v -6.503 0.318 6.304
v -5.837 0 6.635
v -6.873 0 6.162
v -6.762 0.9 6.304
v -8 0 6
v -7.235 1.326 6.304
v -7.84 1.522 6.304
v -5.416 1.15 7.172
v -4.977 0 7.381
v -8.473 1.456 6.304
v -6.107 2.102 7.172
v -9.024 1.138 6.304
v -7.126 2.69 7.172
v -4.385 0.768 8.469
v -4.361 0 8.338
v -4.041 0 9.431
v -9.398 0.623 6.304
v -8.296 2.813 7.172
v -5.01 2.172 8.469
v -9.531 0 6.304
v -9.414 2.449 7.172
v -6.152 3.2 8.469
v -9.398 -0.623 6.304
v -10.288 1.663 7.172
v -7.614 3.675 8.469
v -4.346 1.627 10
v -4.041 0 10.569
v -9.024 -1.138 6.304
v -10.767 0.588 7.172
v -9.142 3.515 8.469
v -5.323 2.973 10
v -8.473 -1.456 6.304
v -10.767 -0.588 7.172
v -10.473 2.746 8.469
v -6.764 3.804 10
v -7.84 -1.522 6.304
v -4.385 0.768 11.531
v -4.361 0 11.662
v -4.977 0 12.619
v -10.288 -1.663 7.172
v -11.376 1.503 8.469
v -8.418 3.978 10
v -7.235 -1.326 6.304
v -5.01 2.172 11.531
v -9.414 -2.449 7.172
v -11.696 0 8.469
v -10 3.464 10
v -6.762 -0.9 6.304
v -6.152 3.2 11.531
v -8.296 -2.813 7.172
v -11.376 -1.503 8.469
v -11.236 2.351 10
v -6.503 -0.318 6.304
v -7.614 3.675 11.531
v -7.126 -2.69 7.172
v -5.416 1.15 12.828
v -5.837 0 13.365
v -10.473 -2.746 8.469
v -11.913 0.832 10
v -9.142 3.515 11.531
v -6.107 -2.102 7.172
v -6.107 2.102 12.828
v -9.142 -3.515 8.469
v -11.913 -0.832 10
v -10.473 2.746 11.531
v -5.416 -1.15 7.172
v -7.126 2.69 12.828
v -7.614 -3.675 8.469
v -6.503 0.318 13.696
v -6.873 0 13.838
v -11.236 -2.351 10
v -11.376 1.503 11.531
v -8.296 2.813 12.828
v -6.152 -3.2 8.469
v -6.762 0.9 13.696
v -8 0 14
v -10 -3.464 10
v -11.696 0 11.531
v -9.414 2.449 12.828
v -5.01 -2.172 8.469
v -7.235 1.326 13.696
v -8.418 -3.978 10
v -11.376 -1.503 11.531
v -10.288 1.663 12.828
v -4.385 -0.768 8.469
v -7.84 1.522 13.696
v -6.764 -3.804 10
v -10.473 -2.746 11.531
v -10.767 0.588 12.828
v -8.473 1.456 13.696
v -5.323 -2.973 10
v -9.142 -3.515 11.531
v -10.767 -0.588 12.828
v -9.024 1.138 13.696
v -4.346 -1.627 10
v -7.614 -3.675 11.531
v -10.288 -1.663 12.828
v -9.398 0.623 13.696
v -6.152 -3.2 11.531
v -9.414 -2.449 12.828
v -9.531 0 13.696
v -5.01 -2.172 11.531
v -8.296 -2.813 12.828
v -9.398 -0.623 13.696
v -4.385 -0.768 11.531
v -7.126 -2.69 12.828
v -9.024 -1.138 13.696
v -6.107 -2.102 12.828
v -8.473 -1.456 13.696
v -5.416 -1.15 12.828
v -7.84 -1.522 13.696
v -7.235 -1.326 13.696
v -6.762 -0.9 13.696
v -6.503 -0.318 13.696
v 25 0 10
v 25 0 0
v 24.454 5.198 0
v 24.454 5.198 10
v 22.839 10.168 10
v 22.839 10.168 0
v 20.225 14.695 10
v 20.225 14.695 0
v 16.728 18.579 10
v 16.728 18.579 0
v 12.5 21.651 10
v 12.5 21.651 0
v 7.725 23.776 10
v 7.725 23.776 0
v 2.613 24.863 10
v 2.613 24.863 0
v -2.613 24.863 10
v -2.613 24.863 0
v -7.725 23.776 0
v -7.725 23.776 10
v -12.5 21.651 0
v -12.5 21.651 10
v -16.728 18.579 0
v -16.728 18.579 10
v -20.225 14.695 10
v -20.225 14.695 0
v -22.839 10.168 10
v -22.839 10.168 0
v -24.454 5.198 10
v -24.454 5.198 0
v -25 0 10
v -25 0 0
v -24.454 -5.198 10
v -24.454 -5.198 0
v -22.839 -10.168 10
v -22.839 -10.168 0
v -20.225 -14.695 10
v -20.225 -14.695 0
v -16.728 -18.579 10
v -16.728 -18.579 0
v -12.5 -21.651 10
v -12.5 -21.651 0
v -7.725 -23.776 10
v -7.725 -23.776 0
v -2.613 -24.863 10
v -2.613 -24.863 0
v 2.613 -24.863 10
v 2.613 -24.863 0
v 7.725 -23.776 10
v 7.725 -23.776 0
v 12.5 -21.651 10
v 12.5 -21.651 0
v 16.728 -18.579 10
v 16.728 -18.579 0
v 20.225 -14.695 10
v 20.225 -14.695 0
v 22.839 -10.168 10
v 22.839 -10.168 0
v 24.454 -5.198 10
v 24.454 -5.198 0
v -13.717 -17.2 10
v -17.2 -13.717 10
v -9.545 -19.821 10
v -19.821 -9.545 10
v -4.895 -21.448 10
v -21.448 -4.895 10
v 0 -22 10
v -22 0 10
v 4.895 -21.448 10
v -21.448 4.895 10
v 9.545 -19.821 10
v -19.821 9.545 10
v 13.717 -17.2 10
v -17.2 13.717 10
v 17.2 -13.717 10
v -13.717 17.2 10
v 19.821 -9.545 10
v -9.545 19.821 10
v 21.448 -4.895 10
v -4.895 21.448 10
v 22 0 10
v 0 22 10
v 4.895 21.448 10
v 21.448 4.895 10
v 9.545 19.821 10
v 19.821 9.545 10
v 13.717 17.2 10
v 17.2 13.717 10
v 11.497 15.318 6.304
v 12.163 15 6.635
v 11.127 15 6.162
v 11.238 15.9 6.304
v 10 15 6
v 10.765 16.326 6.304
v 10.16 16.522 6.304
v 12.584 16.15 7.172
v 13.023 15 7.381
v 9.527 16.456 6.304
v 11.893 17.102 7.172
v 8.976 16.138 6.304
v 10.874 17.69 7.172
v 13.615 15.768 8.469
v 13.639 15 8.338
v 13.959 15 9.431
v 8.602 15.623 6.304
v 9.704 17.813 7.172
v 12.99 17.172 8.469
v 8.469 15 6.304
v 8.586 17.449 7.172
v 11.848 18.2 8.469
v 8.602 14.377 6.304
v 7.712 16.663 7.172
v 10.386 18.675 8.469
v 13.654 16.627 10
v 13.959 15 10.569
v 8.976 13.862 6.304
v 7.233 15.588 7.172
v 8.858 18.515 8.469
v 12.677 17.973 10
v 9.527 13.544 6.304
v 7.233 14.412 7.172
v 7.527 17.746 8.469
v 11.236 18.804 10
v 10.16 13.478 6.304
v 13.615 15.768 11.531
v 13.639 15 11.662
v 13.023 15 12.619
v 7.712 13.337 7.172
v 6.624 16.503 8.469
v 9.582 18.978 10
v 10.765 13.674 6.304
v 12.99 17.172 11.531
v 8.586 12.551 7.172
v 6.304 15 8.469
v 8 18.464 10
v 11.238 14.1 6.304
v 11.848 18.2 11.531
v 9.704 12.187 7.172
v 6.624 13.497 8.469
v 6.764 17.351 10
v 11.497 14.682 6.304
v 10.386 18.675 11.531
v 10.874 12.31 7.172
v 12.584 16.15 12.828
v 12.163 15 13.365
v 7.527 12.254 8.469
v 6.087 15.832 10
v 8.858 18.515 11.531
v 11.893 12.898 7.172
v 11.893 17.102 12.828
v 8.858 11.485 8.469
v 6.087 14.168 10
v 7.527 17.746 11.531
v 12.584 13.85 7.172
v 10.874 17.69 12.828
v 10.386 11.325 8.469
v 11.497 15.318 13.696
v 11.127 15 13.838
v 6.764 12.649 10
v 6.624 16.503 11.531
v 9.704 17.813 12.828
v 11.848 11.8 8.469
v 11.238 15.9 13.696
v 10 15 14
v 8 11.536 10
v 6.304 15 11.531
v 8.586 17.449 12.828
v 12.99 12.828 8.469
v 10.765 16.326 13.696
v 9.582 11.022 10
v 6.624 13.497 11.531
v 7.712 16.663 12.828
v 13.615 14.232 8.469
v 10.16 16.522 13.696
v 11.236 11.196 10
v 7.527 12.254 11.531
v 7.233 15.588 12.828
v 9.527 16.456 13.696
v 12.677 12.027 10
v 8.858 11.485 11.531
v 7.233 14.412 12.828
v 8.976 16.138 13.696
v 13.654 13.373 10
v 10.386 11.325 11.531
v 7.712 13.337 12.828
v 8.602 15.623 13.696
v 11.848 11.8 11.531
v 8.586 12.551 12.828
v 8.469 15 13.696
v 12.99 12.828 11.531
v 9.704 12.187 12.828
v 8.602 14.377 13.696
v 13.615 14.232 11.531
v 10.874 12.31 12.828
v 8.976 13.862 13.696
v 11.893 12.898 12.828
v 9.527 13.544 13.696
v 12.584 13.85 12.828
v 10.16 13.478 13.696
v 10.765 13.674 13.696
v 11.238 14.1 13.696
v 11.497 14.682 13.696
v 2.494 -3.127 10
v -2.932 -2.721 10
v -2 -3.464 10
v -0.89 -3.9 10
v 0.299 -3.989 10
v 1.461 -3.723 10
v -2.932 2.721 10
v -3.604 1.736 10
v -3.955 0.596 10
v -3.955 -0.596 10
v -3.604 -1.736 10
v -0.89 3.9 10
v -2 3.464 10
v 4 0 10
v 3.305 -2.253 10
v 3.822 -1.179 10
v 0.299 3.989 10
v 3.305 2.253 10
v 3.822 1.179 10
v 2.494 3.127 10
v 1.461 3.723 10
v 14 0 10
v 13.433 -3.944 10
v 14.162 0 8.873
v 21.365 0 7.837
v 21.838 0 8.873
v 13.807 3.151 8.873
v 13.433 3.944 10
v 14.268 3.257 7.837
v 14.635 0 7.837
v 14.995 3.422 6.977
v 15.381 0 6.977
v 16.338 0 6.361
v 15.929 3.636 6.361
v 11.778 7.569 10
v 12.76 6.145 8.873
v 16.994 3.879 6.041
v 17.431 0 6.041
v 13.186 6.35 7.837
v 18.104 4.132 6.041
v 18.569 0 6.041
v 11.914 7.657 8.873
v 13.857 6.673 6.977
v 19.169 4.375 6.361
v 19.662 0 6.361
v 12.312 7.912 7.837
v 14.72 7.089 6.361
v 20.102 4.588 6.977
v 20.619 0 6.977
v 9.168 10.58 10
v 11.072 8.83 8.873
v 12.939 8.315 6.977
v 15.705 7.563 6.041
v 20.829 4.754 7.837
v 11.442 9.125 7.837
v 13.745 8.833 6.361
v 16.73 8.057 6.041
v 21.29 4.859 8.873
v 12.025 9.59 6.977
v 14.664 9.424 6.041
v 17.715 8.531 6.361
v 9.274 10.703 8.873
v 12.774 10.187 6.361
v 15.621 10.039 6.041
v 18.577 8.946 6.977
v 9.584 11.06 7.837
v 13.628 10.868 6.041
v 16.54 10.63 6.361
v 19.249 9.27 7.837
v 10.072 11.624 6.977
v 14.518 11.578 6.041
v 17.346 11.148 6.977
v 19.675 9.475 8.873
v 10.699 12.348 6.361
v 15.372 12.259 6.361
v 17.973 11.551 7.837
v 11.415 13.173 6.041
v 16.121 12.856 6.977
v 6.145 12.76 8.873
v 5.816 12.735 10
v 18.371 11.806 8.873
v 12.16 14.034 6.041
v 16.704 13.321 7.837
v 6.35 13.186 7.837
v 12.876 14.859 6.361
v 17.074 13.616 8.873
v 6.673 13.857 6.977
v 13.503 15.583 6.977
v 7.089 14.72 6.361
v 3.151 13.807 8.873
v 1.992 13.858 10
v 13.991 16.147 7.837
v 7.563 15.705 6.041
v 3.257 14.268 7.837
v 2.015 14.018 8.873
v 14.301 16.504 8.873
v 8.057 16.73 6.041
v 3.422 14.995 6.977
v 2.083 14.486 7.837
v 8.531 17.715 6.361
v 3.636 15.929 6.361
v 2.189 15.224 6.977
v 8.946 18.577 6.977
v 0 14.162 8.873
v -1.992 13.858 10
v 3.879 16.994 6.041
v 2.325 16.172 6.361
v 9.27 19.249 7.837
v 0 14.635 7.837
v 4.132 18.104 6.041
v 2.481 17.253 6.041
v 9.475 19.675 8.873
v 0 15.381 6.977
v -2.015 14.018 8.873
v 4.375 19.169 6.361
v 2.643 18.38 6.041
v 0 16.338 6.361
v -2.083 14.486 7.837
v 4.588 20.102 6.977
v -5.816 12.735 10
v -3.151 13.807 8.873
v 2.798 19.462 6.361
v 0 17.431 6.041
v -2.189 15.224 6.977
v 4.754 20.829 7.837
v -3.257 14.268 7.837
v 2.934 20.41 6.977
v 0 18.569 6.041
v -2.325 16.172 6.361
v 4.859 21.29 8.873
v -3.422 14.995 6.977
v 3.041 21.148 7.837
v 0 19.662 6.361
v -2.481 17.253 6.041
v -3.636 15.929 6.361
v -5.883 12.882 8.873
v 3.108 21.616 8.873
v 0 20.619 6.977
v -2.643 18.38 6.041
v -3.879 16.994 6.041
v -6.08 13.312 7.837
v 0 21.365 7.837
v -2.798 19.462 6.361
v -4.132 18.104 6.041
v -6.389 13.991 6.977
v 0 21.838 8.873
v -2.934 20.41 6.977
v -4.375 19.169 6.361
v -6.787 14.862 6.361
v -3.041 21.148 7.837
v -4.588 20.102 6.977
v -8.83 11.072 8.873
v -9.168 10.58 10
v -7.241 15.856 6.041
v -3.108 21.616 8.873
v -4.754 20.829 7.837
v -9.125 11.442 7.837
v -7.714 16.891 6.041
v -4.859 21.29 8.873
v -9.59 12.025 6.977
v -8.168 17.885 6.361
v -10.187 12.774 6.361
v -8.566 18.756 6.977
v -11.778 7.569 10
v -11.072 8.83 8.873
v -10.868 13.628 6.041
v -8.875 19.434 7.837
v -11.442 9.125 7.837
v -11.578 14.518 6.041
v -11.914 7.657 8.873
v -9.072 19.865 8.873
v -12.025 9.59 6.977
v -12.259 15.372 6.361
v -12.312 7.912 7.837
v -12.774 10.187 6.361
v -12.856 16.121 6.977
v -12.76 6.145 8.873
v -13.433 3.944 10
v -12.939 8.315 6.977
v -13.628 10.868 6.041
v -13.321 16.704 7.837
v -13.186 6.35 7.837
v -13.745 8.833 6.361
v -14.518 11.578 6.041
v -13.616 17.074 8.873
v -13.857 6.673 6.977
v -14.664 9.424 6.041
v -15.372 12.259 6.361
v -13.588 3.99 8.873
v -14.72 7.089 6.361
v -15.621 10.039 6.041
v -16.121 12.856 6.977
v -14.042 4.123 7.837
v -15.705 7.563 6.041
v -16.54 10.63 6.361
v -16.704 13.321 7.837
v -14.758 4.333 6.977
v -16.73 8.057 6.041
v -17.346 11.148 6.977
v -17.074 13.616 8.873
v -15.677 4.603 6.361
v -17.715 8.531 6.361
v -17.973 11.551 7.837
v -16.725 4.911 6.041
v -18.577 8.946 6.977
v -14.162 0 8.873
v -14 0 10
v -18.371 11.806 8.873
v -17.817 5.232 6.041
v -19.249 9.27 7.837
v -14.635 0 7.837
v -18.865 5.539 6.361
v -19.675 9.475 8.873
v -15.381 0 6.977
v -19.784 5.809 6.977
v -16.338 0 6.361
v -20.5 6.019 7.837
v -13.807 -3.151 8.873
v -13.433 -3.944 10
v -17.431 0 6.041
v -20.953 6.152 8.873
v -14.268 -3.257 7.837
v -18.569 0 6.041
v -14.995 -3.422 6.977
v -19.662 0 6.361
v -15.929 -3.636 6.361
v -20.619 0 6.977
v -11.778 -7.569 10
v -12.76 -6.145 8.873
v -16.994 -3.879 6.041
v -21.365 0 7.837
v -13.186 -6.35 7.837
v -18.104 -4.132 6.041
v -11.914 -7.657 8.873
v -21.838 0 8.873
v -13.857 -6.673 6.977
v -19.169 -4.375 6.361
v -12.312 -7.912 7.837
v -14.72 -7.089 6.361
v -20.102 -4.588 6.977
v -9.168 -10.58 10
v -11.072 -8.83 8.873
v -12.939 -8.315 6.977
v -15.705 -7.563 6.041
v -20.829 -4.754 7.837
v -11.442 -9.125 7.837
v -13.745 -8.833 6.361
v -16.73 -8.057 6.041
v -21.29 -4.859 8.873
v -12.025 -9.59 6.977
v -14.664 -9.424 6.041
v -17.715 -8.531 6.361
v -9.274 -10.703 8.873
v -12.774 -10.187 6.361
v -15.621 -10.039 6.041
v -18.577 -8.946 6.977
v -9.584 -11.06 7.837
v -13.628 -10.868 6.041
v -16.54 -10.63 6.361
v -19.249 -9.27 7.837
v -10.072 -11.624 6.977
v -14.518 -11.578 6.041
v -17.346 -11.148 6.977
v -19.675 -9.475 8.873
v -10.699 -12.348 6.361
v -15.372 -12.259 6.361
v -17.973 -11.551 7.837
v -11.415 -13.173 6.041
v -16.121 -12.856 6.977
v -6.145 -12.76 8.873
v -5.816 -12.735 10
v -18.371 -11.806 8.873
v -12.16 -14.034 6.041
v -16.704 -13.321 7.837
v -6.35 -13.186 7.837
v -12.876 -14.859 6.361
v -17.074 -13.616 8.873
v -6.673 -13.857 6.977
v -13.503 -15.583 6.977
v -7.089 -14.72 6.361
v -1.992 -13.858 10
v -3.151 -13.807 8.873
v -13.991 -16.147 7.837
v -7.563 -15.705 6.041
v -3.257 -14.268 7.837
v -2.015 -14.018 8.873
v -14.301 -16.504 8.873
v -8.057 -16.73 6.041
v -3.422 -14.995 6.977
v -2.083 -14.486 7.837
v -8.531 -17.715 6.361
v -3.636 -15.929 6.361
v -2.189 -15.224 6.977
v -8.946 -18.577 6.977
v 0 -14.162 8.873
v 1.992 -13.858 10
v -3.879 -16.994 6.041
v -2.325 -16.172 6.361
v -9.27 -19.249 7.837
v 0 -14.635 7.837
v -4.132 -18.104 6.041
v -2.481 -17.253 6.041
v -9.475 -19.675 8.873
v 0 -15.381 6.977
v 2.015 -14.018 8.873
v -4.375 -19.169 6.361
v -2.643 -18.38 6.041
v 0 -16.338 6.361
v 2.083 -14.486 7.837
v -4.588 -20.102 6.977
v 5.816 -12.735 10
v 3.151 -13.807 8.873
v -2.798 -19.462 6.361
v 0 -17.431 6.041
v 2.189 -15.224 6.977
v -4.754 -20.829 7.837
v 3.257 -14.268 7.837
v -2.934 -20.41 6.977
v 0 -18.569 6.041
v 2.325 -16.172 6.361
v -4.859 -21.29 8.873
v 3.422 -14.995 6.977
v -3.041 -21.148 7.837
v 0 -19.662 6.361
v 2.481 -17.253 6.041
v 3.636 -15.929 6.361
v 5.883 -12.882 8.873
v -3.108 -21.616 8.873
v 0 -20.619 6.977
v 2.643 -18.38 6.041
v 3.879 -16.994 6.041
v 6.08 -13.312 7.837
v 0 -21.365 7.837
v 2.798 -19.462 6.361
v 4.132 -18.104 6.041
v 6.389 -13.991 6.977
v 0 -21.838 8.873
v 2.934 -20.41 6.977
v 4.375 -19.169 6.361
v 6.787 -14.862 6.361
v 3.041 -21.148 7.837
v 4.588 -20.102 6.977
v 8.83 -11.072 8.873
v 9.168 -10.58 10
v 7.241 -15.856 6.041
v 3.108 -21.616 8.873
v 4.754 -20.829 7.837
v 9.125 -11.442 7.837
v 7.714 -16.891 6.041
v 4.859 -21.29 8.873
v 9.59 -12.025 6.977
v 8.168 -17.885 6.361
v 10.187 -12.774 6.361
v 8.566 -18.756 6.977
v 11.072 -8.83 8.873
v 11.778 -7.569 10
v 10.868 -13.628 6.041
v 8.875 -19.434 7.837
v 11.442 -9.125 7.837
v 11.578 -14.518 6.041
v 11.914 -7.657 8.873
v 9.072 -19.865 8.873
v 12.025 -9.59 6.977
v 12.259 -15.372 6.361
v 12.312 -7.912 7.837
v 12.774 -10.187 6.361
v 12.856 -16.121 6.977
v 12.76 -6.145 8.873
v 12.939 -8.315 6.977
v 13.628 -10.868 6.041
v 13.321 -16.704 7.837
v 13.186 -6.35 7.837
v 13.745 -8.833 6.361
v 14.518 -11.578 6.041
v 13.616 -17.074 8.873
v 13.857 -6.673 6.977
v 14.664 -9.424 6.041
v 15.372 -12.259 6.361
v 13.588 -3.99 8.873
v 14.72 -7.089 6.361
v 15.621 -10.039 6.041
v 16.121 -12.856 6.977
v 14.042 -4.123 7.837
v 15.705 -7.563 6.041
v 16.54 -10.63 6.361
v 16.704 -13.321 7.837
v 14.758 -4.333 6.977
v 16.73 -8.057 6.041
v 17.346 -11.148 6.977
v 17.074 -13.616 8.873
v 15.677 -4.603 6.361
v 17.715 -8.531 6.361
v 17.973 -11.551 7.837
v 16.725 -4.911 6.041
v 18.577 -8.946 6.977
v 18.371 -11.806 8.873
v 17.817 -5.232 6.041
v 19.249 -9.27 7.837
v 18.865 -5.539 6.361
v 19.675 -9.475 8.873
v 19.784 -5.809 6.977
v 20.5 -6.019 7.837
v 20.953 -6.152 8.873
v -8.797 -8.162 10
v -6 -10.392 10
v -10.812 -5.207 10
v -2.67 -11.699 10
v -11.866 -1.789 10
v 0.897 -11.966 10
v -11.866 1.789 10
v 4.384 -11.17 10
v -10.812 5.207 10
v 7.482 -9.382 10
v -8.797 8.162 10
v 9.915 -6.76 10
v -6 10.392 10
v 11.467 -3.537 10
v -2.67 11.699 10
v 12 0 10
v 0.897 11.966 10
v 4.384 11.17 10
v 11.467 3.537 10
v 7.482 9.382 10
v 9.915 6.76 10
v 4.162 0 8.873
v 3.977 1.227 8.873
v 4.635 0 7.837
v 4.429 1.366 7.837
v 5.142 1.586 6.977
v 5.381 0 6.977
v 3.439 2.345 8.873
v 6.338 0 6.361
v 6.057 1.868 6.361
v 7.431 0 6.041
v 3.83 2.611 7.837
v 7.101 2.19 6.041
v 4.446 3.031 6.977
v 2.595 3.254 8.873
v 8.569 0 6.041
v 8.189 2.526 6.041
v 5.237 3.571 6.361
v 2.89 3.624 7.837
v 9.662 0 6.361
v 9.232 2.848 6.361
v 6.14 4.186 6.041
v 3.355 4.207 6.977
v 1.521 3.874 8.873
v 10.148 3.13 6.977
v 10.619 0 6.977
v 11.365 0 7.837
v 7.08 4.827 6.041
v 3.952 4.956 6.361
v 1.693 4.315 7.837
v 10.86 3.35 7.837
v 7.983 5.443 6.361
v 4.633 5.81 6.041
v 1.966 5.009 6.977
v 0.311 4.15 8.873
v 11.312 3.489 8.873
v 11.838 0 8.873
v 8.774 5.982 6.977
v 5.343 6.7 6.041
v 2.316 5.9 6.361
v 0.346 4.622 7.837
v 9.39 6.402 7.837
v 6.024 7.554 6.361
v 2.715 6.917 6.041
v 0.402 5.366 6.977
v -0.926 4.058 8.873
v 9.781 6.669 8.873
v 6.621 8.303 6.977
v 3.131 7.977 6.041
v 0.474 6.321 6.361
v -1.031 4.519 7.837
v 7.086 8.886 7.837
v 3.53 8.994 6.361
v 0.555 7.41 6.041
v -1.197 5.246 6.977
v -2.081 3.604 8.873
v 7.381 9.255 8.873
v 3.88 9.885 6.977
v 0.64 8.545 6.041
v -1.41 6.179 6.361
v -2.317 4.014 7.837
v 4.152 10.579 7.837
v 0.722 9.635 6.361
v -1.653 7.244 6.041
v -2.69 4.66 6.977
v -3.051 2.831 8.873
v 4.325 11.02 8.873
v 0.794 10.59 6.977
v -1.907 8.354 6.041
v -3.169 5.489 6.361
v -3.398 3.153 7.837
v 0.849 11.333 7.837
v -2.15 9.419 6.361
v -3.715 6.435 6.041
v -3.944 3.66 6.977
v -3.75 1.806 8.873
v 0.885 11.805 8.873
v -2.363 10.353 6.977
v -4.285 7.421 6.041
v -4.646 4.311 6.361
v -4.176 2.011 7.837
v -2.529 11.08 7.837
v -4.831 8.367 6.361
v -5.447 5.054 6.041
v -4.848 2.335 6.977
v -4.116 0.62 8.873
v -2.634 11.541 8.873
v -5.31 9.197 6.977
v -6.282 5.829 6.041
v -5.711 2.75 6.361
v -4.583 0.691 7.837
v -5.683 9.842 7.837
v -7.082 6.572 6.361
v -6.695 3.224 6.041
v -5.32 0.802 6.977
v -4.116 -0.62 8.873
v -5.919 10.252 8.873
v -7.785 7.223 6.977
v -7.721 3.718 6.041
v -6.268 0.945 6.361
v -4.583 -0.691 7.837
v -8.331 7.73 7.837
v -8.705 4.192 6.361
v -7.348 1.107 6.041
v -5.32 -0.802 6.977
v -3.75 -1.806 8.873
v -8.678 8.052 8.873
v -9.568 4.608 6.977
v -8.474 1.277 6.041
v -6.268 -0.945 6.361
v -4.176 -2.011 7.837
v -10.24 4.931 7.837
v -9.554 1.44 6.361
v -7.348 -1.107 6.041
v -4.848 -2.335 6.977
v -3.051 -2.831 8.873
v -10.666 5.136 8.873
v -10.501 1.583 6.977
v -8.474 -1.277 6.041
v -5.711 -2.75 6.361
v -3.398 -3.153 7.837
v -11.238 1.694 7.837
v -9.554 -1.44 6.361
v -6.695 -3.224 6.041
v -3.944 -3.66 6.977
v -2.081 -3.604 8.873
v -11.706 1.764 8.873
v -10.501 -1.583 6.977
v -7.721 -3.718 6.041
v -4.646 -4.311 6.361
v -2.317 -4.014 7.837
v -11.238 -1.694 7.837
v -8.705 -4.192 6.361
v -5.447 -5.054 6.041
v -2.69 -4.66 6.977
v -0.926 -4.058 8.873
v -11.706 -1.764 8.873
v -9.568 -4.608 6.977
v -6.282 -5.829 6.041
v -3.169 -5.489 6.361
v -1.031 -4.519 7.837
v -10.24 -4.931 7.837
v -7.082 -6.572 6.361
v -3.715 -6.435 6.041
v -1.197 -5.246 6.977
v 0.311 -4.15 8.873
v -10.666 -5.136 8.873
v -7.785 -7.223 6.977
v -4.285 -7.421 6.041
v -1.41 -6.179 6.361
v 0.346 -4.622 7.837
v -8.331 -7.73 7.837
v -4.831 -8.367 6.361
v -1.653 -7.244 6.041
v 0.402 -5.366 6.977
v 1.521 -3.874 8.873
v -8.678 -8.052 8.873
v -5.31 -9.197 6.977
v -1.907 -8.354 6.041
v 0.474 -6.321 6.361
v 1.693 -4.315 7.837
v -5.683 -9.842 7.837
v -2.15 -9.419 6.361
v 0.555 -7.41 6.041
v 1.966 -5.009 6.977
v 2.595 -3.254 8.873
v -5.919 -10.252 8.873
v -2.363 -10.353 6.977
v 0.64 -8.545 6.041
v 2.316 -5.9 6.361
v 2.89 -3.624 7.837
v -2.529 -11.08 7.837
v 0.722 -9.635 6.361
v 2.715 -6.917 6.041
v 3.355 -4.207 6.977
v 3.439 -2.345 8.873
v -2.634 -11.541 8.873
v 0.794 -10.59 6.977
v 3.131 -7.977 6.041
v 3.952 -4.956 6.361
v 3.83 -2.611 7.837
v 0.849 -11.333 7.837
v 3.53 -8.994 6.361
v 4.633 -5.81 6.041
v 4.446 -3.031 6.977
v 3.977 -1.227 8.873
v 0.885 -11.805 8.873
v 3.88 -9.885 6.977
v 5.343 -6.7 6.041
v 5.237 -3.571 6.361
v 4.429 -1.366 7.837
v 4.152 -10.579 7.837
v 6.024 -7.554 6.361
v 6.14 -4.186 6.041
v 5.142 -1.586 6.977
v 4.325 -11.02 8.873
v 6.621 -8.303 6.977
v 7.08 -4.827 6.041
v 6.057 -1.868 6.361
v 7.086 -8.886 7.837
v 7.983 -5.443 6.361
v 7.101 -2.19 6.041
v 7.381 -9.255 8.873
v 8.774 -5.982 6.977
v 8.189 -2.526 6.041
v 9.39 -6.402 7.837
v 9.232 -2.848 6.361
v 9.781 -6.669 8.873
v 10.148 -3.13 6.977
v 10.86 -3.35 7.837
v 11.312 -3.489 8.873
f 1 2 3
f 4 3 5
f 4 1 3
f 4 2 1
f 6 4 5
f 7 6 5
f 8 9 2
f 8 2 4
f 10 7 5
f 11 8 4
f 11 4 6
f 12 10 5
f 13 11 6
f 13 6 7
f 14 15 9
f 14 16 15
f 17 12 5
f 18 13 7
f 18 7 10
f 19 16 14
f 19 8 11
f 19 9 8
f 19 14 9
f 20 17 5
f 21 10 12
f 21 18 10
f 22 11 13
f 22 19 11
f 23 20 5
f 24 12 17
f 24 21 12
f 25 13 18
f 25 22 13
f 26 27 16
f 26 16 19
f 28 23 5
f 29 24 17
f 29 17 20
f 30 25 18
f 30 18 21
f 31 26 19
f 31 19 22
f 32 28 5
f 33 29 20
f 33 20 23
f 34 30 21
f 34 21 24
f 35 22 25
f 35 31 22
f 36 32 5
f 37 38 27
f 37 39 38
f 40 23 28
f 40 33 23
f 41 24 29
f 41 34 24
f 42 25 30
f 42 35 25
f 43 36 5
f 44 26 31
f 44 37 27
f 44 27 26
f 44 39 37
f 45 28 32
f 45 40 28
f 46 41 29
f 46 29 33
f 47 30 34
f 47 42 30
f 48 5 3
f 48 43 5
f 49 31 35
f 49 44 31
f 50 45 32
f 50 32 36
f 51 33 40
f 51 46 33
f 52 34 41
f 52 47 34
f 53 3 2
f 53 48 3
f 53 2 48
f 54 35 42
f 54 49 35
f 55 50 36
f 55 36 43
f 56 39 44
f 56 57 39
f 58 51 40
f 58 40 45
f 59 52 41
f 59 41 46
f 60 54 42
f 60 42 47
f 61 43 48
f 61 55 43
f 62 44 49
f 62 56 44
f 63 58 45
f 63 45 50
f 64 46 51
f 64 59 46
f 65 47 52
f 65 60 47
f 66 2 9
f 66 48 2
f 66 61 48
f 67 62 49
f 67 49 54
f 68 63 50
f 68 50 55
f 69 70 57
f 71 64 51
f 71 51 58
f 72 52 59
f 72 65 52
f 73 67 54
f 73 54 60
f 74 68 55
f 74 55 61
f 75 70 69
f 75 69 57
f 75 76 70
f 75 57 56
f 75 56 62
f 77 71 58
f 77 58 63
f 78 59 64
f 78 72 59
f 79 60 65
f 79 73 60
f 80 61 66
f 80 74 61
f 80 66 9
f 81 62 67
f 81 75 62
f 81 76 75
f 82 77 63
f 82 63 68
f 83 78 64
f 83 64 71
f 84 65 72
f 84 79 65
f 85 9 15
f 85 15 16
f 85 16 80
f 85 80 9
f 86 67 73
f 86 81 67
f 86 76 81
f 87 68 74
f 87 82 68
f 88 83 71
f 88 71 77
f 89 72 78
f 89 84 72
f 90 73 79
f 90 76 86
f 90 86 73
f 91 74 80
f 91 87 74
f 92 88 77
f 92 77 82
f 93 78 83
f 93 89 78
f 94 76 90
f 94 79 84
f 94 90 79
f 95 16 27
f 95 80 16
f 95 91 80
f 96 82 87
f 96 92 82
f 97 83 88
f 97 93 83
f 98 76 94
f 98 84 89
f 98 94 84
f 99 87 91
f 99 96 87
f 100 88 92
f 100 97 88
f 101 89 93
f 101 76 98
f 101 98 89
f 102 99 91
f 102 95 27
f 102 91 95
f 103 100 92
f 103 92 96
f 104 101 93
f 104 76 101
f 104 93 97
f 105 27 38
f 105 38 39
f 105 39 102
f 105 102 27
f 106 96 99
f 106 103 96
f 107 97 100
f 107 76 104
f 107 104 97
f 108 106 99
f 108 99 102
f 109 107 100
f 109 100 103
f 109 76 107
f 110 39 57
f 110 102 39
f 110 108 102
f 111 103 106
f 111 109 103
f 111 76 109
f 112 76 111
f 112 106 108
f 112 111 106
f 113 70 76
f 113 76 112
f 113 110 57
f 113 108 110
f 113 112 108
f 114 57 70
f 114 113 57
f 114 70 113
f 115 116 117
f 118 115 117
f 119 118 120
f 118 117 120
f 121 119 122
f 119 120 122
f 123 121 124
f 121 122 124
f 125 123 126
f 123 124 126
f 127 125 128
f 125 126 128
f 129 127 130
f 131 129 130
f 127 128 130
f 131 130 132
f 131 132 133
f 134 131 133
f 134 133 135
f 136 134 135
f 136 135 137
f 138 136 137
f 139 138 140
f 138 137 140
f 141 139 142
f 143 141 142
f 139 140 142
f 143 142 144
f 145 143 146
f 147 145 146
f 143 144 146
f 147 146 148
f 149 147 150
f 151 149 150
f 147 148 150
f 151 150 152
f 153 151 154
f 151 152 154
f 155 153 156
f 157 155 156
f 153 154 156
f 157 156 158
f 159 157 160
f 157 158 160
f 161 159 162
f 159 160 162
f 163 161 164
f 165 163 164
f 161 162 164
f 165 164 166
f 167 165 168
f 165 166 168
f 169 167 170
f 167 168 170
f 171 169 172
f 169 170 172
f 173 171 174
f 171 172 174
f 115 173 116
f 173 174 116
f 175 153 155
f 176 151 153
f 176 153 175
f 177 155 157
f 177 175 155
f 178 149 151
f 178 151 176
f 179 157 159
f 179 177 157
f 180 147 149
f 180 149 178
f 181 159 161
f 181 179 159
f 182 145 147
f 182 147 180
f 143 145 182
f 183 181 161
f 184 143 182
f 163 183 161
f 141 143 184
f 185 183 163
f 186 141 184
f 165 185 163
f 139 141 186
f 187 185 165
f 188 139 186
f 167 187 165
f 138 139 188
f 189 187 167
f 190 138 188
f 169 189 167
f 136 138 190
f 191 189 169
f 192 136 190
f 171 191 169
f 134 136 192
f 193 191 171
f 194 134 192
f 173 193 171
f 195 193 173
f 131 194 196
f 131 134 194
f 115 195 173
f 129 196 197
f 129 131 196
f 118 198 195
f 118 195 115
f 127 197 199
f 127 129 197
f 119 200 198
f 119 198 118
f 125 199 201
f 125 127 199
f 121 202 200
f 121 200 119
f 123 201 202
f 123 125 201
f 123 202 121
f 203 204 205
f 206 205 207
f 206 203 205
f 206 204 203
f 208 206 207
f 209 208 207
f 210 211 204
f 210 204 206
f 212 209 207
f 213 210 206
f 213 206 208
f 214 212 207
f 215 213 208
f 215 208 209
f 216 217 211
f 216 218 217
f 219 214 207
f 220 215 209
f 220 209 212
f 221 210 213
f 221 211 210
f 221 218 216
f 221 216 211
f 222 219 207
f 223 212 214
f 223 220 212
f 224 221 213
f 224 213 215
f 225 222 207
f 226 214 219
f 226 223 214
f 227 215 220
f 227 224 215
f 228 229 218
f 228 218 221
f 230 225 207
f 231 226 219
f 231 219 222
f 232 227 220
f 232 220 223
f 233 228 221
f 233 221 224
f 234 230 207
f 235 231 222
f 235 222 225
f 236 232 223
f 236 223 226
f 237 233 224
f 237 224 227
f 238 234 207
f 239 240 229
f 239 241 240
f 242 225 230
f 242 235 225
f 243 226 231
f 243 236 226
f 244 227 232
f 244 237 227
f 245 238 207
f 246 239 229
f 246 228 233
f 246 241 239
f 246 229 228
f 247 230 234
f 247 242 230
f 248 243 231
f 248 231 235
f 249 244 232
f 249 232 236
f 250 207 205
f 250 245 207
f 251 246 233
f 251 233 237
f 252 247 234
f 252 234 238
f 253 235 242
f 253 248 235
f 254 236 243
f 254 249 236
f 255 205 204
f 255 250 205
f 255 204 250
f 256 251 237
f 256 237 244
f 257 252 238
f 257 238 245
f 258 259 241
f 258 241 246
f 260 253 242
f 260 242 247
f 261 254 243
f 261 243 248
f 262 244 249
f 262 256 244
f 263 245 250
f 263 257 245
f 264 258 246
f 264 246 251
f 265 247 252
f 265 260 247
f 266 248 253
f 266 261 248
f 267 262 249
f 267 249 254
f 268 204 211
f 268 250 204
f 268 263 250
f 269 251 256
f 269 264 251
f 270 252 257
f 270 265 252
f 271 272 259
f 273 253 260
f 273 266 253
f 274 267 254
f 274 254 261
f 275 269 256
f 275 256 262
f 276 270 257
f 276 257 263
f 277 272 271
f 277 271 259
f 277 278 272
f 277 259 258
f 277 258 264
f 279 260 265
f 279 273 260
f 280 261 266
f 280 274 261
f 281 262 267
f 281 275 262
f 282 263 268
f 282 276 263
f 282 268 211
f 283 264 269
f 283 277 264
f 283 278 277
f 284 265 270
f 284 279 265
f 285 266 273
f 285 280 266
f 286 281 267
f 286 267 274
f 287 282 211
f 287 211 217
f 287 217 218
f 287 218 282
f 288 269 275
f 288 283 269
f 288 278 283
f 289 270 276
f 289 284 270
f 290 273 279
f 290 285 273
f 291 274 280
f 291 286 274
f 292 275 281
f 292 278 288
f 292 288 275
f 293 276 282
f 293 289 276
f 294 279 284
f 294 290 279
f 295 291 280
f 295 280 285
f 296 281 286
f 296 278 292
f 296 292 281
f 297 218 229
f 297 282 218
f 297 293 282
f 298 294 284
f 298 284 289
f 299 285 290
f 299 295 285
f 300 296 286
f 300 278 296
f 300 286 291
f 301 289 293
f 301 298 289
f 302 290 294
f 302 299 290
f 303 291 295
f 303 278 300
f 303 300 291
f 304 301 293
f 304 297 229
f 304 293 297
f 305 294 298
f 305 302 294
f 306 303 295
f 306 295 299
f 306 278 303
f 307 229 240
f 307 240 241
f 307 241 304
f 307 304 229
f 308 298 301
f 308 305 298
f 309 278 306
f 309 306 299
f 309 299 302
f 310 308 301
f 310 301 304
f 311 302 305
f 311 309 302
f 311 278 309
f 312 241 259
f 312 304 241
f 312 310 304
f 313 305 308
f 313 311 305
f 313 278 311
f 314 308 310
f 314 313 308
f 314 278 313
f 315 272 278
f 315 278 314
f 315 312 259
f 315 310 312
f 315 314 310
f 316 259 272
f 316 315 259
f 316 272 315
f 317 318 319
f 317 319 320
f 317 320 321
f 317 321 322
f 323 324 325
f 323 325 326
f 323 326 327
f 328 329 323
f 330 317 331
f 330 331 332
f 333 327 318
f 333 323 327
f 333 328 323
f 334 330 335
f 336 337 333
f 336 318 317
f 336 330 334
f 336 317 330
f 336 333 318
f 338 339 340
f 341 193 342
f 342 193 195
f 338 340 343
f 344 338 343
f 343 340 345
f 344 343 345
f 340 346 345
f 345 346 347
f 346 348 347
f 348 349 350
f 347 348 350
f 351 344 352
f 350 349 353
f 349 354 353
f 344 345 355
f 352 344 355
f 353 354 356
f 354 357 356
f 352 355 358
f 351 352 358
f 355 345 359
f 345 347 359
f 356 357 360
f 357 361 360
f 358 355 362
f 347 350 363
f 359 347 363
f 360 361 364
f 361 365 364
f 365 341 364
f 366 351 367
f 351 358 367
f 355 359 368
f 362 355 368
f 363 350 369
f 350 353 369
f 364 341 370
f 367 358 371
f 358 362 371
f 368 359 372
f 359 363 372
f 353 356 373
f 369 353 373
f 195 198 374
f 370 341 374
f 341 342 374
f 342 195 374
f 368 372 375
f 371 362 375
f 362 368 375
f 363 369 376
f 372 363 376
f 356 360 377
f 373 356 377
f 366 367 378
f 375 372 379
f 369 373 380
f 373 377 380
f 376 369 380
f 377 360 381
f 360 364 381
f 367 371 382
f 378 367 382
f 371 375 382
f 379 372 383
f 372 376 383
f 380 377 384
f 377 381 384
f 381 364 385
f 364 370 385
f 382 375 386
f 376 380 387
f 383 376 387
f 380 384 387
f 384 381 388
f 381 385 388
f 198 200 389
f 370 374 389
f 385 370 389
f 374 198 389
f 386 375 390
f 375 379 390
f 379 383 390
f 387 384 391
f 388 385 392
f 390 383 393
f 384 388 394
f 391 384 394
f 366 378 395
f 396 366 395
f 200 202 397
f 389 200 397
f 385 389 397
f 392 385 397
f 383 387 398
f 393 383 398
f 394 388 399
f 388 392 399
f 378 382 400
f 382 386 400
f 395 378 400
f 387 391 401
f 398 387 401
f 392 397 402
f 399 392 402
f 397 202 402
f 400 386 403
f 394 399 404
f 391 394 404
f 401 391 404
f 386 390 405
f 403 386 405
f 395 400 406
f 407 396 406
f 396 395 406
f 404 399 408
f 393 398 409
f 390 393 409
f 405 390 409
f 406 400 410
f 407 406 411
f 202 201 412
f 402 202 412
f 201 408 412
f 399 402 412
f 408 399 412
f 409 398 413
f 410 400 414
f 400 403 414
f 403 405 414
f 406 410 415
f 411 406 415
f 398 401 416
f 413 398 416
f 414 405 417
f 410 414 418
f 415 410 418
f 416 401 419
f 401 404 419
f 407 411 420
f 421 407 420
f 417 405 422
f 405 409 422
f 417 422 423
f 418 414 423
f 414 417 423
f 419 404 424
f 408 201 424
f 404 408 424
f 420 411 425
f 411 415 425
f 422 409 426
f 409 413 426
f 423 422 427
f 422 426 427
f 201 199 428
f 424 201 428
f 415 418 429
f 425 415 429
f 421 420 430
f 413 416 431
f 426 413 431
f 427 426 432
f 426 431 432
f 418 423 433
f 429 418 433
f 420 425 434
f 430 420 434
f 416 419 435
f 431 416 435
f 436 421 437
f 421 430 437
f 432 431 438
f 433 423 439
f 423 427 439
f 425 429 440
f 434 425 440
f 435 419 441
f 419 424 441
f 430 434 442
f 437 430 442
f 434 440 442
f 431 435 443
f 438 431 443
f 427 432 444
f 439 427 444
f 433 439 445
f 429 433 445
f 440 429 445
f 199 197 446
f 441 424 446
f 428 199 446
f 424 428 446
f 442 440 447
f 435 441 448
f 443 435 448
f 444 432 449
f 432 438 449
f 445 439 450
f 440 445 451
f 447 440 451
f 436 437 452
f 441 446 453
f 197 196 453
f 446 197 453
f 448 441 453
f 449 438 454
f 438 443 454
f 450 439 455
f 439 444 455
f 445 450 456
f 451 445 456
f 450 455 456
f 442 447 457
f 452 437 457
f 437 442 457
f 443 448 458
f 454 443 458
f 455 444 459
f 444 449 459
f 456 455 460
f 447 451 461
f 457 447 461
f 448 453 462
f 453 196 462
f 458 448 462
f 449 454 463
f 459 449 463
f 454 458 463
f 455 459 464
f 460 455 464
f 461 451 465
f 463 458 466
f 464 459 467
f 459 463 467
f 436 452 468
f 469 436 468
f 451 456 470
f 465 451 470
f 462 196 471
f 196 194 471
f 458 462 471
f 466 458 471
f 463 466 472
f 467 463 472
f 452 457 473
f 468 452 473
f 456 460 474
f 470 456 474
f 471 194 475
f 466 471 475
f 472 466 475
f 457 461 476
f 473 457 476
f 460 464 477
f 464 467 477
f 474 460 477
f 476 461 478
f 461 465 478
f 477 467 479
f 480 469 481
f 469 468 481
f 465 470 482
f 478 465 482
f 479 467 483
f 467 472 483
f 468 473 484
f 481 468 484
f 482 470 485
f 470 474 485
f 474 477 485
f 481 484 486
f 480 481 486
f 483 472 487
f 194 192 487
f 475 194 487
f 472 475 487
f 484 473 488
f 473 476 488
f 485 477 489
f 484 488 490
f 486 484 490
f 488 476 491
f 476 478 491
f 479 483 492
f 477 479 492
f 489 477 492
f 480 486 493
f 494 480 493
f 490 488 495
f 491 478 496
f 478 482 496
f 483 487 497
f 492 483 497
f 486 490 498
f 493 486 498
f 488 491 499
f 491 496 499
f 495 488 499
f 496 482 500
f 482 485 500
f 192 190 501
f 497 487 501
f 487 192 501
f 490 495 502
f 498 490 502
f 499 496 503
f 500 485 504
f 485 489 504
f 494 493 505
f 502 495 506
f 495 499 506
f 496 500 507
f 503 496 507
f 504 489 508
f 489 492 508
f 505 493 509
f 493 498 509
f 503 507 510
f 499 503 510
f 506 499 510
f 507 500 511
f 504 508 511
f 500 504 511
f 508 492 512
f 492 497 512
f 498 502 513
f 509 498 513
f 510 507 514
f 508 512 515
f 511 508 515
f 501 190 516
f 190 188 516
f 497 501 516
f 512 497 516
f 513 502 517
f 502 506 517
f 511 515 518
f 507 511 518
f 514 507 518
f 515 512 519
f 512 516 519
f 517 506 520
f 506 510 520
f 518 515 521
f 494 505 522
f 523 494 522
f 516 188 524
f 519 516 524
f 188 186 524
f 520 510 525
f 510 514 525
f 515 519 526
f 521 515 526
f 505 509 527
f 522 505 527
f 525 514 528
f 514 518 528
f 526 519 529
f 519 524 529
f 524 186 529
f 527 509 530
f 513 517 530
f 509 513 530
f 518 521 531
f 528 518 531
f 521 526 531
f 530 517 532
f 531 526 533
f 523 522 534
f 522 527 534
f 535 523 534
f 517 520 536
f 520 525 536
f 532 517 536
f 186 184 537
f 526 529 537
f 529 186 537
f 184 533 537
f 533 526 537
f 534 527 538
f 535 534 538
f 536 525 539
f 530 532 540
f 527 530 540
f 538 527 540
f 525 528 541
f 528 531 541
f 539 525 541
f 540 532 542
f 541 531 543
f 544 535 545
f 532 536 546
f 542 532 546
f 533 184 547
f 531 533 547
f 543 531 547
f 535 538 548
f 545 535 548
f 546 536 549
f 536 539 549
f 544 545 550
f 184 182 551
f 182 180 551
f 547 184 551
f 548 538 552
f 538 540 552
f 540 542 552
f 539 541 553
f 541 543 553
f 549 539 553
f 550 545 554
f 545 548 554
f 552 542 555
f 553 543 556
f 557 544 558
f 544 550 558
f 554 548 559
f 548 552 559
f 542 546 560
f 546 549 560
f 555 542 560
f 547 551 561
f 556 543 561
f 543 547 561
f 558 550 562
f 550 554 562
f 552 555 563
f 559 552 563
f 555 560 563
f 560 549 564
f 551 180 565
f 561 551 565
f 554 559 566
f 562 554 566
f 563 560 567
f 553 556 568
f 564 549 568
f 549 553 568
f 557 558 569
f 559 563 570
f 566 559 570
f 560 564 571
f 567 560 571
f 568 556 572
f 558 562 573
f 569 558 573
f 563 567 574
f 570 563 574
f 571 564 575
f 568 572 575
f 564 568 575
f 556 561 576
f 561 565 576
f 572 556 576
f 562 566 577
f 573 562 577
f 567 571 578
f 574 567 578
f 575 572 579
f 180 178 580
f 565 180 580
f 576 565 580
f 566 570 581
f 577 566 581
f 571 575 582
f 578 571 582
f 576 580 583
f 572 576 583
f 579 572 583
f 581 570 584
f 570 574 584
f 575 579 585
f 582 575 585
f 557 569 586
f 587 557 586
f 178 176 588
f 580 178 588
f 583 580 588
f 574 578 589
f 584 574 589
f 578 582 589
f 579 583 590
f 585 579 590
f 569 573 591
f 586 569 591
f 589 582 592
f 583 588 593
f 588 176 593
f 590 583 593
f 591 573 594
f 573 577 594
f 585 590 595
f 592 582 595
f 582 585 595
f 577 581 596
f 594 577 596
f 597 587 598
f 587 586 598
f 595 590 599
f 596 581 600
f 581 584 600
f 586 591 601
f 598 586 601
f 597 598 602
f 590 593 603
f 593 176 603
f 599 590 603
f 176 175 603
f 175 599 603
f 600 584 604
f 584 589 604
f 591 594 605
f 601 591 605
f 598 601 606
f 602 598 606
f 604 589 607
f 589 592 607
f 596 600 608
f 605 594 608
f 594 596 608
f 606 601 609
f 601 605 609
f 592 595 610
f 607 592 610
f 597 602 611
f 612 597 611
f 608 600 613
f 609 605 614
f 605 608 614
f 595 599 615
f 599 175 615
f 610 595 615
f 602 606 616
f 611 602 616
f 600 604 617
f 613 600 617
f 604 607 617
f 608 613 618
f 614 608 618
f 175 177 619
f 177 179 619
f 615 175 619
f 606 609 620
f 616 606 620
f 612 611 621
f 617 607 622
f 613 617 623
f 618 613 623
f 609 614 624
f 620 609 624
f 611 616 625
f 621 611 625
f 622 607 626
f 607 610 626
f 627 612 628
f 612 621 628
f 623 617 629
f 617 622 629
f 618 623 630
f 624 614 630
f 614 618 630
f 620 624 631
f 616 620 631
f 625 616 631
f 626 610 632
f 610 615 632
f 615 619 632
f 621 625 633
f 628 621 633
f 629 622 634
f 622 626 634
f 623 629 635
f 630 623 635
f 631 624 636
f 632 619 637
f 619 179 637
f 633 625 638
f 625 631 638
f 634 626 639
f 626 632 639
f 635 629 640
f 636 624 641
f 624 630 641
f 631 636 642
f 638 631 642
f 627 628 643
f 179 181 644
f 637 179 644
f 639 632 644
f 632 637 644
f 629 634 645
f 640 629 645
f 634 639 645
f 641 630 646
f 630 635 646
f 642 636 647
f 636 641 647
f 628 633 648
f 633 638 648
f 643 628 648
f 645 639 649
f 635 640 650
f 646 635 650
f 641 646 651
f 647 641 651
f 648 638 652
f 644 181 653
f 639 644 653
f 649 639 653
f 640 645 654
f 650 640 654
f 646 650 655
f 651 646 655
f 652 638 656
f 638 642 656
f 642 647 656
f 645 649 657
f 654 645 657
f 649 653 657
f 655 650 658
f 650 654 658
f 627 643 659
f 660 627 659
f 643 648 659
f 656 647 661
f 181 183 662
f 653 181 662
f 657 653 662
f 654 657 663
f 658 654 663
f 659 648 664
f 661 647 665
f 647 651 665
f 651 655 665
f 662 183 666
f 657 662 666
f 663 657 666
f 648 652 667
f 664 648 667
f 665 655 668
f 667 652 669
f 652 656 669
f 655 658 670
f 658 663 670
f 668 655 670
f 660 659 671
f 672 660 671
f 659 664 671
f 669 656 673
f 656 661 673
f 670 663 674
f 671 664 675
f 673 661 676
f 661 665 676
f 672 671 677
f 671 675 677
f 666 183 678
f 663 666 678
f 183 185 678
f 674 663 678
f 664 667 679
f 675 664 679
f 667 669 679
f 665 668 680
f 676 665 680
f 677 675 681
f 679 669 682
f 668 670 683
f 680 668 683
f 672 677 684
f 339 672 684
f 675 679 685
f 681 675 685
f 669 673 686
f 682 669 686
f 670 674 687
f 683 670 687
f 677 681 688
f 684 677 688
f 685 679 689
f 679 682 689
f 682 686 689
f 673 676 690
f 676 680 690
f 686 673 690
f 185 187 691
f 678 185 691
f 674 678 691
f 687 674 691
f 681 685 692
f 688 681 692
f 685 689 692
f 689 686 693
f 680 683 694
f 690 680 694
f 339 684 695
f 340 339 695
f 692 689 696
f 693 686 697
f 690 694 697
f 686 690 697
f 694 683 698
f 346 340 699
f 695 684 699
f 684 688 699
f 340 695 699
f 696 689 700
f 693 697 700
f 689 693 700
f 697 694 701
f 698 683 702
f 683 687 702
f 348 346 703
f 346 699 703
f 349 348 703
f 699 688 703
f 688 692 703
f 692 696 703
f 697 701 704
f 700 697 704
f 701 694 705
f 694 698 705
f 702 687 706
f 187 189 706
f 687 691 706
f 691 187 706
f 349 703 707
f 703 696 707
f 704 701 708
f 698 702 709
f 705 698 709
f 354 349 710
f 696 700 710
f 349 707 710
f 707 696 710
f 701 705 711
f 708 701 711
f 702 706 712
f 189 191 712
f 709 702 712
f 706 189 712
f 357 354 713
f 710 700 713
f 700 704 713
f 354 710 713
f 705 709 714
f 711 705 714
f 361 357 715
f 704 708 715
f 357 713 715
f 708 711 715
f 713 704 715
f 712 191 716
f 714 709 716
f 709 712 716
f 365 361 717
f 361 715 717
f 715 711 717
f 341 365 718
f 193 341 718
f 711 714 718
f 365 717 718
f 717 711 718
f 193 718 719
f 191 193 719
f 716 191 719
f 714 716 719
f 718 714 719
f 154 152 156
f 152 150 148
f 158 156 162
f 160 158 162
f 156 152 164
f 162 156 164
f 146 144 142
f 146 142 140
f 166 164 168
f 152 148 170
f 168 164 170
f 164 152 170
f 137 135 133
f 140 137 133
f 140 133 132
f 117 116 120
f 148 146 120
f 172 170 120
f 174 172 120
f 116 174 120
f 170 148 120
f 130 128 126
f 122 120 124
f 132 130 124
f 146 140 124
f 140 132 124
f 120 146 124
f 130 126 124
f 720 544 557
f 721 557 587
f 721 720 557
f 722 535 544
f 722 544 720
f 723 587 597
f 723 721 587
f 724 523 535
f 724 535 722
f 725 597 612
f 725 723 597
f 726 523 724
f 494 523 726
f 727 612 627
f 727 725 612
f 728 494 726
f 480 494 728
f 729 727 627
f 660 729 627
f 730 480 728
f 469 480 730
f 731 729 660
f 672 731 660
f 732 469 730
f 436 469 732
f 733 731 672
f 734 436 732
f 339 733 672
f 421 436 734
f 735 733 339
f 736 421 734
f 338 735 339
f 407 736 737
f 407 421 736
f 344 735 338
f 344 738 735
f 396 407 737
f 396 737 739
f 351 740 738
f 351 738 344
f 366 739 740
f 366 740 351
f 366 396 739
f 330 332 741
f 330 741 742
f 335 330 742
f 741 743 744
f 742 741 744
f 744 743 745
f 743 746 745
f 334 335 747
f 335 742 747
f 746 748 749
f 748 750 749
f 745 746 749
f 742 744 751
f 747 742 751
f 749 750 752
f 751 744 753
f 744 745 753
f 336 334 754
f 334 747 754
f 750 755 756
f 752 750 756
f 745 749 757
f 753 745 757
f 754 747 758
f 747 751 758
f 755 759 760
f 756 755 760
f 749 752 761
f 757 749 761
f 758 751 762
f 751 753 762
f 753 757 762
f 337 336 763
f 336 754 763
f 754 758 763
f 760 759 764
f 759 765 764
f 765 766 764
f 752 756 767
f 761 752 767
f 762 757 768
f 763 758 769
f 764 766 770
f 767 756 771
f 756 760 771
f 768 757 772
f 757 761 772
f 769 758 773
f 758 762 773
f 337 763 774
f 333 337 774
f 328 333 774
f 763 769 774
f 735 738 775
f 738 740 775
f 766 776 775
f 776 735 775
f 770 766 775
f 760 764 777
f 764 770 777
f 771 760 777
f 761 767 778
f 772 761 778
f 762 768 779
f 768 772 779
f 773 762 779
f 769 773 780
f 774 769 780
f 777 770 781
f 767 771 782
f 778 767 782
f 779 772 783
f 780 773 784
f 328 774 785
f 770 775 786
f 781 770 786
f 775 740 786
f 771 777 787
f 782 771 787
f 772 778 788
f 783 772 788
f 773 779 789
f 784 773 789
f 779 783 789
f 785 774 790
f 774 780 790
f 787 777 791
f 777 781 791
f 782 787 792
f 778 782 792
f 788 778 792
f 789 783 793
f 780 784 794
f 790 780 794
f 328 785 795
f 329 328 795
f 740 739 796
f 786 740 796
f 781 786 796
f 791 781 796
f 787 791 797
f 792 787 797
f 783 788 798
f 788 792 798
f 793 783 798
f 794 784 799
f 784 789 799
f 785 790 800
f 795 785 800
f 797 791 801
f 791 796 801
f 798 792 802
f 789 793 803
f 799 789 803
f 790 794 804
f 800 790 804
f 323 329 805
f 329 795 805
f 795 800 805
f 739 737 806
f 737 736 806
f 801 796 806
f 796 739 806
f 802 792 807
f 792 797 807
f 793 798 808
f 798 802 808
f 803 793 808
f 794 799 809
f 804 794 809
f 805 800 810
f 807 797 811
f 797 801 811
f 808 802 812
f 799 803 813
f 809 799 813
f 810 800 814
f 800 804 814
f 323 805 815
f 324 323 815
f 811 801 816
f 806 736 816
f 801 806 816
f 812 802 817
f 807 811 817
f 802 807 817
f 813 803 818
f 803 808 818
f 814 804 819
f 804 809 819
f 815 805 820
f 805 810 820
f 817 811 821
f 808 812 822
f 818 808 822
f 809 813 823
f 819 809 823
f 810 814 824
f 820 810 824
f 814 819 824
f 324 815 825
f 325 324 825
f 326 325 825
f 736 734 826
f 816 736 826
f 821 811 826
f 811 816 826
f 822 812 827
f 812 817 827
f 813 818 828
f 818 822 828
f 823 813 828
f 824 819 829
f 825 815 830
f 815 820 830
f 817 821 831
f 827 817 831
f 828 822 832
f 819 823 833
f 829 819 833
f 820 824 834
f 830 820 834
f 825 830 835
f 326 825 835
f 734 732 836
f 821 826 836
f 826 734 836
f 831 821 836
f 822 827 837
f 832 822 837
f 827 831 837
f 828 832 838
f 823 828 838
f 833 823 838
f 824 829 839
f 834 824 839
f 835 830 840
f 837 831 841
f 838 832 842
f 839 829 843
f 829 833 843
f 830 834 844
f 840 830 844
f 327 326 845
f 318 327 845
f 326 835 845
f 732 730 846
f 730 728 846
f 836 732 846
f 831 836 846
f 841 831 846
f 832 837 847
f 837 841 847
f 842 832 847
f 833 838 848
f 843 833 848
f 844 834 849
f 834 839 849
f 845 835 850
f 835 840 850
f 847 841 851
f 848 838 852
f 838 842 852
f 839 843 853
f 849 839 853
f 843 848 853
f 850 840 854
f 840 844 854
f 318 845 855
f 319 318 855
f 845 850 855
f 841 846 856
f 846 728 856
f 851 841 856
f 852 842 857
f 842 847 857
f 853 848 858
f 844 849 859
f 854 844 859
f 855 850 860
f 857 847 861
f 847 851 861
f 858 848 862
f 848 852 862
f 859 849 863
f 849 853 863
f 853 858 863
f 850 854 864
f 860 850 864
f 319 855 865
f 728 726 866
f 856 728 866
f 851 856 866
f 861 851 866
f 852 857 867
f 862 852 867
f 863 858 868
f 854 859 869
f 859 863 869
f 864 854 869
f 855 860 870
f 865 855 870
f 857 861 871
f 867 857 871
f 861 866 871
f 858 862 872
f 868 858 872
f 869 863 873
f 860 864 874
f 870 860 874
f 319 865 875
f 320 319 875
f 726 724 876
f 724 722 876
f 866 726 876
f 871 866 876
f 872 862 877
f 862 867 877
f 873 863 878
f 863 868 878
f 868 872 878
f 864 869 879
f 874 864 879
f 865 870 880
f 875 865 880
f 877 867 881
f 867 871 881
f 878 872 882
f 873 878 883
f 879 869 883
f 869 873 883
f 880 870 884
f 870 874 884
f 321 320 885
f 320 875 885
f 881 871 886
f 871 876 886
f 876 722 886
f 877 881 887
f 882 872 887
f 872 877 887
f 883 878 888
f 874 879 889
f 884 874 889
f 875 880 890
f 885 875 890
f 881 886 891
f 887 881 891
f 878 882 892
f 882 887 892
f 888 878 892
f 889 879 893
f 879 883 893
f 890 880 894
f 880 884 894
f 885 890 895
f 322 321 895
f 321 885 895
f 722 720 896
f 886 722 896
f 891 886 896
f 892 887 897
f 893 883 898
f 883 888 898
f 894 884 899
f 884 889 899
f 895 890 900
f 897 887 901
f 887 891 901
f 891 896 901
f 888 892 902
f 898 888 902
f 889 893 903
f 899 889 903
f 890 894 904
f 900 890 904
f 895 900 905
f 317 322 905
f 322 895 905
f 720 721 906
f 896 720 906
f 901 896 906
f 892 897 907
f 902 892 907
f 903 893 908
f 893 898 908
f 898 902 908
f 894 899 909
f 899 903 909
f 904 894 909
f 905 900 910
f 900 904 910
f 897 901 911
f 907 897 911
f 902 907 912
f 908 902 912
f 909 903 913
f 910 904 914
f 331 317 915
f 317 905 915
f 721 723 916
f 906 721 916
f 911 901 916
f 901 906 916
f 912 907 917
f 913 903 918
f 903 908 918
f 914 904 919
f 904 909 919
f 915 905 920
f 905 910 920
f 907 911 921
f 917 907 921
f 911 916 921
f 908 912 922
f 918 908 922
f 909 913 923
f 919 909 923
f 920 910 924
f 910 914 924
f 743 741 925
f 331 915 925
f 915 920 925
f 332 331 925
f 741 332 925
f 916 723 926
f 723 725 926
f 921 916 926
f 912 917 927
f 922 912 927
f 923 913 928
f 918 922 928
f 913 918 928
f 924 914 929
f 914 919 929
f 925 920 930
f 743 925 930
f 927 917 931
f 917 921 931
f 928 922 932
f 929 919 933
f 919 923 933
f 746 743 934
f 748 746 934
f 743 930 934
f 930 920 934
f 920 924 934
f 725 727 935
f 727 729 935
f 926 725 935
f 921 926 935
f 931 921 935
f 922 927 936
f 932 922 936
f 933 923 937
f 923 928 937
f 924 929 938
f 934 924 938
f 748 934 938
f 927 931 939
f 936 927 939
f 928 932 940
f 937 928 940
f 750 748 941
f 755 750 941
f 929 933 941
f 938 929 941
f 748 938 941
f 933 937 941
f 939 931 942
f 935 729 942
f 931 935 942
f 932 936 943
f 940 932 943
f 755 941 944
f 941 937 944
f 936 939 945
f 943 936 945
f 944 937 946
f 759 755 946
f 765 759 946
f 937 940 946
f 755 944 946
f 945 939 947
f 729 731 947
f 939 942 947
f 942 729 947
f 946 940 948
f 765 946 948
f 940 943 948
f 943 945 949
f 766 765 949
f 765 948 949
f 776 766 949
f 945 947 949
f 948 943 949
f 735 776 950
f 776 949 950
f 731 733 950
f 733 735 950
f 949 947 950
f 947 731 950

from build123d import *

# Parameters (mm, degrees)
TORUS001_R     = 4
TORUS_R        = 4
CYLINDER_R     = 25
CYLINDER_DEPTH = 10


with BuildPart() as rail_externo:
    # Torus001 → Torus001 (revolve)
    with BuildSketch(Plane.XZ):
        with Locations((18, 0)):
            Circle(TORUS001_R)
    revolve(axis=Axis((0, 0, 0), (0, 0, 1)))


with BuildPart() as railes:
    # Torus → Torus (revolve)
    with BuildSketch(Plane.XZ):
        with Locations((8, 0)):
            Circle(TORUS_R)
    revolve(axis=Axis((0, 0, 0), (0, 0, 1)))

    # Fusion: union rail_externo
    add(rail_externo.part)


with BuildPart() as railes_1:
    # Fusion placement: moved
    add(railes.part.moved(Location((0, 0, 10))))


with BuildPart() as porta_railes:
    # Cylinder → Cylinder (new body)
    with BuildSketch(Plane.XY):
        Circle(CYLINDER_R)
    extrude(amount=CYLINDER_DEPTH)

    # Cut: cut railes
    add(railes_1.part, mode=Mode.SUBTRACT)


with BuildPart() as sphere:
    # Sphere → Sphere (revolve)
    with BuildSketch(Plane(origin=(-8, 0, 10), x_dir=(1, 0, 0), z_dir=(0, -1, 0))):
        with BuildLine():
            ThreePointArc((0, -4), (4, 0), (0, 4))
            Line((0, 4), (0, -4))
        make_face()
    revolve(axis=Axis((-8, 0, 10), (0, 0, 1)))


with BuildPart() as sphere001:
    # Sphere001 → Sphere001 (revolve)
    with BuildSketch(Plane(origin=(10, 15, 10), x_dir=(1, 0, 0), z_dir=(0, -1, 0))):
        with BuildLine():
            ThreePointArc((0, -4), (4, 0), (0, 4))
            Line((0, 4), (0, -4))
        make_face()
    revolve(axis=Axis((10, 15, 10), (0, 0, 1)))


solid = Compound([porta_railes.part, sphere.part, sphere001.part])
